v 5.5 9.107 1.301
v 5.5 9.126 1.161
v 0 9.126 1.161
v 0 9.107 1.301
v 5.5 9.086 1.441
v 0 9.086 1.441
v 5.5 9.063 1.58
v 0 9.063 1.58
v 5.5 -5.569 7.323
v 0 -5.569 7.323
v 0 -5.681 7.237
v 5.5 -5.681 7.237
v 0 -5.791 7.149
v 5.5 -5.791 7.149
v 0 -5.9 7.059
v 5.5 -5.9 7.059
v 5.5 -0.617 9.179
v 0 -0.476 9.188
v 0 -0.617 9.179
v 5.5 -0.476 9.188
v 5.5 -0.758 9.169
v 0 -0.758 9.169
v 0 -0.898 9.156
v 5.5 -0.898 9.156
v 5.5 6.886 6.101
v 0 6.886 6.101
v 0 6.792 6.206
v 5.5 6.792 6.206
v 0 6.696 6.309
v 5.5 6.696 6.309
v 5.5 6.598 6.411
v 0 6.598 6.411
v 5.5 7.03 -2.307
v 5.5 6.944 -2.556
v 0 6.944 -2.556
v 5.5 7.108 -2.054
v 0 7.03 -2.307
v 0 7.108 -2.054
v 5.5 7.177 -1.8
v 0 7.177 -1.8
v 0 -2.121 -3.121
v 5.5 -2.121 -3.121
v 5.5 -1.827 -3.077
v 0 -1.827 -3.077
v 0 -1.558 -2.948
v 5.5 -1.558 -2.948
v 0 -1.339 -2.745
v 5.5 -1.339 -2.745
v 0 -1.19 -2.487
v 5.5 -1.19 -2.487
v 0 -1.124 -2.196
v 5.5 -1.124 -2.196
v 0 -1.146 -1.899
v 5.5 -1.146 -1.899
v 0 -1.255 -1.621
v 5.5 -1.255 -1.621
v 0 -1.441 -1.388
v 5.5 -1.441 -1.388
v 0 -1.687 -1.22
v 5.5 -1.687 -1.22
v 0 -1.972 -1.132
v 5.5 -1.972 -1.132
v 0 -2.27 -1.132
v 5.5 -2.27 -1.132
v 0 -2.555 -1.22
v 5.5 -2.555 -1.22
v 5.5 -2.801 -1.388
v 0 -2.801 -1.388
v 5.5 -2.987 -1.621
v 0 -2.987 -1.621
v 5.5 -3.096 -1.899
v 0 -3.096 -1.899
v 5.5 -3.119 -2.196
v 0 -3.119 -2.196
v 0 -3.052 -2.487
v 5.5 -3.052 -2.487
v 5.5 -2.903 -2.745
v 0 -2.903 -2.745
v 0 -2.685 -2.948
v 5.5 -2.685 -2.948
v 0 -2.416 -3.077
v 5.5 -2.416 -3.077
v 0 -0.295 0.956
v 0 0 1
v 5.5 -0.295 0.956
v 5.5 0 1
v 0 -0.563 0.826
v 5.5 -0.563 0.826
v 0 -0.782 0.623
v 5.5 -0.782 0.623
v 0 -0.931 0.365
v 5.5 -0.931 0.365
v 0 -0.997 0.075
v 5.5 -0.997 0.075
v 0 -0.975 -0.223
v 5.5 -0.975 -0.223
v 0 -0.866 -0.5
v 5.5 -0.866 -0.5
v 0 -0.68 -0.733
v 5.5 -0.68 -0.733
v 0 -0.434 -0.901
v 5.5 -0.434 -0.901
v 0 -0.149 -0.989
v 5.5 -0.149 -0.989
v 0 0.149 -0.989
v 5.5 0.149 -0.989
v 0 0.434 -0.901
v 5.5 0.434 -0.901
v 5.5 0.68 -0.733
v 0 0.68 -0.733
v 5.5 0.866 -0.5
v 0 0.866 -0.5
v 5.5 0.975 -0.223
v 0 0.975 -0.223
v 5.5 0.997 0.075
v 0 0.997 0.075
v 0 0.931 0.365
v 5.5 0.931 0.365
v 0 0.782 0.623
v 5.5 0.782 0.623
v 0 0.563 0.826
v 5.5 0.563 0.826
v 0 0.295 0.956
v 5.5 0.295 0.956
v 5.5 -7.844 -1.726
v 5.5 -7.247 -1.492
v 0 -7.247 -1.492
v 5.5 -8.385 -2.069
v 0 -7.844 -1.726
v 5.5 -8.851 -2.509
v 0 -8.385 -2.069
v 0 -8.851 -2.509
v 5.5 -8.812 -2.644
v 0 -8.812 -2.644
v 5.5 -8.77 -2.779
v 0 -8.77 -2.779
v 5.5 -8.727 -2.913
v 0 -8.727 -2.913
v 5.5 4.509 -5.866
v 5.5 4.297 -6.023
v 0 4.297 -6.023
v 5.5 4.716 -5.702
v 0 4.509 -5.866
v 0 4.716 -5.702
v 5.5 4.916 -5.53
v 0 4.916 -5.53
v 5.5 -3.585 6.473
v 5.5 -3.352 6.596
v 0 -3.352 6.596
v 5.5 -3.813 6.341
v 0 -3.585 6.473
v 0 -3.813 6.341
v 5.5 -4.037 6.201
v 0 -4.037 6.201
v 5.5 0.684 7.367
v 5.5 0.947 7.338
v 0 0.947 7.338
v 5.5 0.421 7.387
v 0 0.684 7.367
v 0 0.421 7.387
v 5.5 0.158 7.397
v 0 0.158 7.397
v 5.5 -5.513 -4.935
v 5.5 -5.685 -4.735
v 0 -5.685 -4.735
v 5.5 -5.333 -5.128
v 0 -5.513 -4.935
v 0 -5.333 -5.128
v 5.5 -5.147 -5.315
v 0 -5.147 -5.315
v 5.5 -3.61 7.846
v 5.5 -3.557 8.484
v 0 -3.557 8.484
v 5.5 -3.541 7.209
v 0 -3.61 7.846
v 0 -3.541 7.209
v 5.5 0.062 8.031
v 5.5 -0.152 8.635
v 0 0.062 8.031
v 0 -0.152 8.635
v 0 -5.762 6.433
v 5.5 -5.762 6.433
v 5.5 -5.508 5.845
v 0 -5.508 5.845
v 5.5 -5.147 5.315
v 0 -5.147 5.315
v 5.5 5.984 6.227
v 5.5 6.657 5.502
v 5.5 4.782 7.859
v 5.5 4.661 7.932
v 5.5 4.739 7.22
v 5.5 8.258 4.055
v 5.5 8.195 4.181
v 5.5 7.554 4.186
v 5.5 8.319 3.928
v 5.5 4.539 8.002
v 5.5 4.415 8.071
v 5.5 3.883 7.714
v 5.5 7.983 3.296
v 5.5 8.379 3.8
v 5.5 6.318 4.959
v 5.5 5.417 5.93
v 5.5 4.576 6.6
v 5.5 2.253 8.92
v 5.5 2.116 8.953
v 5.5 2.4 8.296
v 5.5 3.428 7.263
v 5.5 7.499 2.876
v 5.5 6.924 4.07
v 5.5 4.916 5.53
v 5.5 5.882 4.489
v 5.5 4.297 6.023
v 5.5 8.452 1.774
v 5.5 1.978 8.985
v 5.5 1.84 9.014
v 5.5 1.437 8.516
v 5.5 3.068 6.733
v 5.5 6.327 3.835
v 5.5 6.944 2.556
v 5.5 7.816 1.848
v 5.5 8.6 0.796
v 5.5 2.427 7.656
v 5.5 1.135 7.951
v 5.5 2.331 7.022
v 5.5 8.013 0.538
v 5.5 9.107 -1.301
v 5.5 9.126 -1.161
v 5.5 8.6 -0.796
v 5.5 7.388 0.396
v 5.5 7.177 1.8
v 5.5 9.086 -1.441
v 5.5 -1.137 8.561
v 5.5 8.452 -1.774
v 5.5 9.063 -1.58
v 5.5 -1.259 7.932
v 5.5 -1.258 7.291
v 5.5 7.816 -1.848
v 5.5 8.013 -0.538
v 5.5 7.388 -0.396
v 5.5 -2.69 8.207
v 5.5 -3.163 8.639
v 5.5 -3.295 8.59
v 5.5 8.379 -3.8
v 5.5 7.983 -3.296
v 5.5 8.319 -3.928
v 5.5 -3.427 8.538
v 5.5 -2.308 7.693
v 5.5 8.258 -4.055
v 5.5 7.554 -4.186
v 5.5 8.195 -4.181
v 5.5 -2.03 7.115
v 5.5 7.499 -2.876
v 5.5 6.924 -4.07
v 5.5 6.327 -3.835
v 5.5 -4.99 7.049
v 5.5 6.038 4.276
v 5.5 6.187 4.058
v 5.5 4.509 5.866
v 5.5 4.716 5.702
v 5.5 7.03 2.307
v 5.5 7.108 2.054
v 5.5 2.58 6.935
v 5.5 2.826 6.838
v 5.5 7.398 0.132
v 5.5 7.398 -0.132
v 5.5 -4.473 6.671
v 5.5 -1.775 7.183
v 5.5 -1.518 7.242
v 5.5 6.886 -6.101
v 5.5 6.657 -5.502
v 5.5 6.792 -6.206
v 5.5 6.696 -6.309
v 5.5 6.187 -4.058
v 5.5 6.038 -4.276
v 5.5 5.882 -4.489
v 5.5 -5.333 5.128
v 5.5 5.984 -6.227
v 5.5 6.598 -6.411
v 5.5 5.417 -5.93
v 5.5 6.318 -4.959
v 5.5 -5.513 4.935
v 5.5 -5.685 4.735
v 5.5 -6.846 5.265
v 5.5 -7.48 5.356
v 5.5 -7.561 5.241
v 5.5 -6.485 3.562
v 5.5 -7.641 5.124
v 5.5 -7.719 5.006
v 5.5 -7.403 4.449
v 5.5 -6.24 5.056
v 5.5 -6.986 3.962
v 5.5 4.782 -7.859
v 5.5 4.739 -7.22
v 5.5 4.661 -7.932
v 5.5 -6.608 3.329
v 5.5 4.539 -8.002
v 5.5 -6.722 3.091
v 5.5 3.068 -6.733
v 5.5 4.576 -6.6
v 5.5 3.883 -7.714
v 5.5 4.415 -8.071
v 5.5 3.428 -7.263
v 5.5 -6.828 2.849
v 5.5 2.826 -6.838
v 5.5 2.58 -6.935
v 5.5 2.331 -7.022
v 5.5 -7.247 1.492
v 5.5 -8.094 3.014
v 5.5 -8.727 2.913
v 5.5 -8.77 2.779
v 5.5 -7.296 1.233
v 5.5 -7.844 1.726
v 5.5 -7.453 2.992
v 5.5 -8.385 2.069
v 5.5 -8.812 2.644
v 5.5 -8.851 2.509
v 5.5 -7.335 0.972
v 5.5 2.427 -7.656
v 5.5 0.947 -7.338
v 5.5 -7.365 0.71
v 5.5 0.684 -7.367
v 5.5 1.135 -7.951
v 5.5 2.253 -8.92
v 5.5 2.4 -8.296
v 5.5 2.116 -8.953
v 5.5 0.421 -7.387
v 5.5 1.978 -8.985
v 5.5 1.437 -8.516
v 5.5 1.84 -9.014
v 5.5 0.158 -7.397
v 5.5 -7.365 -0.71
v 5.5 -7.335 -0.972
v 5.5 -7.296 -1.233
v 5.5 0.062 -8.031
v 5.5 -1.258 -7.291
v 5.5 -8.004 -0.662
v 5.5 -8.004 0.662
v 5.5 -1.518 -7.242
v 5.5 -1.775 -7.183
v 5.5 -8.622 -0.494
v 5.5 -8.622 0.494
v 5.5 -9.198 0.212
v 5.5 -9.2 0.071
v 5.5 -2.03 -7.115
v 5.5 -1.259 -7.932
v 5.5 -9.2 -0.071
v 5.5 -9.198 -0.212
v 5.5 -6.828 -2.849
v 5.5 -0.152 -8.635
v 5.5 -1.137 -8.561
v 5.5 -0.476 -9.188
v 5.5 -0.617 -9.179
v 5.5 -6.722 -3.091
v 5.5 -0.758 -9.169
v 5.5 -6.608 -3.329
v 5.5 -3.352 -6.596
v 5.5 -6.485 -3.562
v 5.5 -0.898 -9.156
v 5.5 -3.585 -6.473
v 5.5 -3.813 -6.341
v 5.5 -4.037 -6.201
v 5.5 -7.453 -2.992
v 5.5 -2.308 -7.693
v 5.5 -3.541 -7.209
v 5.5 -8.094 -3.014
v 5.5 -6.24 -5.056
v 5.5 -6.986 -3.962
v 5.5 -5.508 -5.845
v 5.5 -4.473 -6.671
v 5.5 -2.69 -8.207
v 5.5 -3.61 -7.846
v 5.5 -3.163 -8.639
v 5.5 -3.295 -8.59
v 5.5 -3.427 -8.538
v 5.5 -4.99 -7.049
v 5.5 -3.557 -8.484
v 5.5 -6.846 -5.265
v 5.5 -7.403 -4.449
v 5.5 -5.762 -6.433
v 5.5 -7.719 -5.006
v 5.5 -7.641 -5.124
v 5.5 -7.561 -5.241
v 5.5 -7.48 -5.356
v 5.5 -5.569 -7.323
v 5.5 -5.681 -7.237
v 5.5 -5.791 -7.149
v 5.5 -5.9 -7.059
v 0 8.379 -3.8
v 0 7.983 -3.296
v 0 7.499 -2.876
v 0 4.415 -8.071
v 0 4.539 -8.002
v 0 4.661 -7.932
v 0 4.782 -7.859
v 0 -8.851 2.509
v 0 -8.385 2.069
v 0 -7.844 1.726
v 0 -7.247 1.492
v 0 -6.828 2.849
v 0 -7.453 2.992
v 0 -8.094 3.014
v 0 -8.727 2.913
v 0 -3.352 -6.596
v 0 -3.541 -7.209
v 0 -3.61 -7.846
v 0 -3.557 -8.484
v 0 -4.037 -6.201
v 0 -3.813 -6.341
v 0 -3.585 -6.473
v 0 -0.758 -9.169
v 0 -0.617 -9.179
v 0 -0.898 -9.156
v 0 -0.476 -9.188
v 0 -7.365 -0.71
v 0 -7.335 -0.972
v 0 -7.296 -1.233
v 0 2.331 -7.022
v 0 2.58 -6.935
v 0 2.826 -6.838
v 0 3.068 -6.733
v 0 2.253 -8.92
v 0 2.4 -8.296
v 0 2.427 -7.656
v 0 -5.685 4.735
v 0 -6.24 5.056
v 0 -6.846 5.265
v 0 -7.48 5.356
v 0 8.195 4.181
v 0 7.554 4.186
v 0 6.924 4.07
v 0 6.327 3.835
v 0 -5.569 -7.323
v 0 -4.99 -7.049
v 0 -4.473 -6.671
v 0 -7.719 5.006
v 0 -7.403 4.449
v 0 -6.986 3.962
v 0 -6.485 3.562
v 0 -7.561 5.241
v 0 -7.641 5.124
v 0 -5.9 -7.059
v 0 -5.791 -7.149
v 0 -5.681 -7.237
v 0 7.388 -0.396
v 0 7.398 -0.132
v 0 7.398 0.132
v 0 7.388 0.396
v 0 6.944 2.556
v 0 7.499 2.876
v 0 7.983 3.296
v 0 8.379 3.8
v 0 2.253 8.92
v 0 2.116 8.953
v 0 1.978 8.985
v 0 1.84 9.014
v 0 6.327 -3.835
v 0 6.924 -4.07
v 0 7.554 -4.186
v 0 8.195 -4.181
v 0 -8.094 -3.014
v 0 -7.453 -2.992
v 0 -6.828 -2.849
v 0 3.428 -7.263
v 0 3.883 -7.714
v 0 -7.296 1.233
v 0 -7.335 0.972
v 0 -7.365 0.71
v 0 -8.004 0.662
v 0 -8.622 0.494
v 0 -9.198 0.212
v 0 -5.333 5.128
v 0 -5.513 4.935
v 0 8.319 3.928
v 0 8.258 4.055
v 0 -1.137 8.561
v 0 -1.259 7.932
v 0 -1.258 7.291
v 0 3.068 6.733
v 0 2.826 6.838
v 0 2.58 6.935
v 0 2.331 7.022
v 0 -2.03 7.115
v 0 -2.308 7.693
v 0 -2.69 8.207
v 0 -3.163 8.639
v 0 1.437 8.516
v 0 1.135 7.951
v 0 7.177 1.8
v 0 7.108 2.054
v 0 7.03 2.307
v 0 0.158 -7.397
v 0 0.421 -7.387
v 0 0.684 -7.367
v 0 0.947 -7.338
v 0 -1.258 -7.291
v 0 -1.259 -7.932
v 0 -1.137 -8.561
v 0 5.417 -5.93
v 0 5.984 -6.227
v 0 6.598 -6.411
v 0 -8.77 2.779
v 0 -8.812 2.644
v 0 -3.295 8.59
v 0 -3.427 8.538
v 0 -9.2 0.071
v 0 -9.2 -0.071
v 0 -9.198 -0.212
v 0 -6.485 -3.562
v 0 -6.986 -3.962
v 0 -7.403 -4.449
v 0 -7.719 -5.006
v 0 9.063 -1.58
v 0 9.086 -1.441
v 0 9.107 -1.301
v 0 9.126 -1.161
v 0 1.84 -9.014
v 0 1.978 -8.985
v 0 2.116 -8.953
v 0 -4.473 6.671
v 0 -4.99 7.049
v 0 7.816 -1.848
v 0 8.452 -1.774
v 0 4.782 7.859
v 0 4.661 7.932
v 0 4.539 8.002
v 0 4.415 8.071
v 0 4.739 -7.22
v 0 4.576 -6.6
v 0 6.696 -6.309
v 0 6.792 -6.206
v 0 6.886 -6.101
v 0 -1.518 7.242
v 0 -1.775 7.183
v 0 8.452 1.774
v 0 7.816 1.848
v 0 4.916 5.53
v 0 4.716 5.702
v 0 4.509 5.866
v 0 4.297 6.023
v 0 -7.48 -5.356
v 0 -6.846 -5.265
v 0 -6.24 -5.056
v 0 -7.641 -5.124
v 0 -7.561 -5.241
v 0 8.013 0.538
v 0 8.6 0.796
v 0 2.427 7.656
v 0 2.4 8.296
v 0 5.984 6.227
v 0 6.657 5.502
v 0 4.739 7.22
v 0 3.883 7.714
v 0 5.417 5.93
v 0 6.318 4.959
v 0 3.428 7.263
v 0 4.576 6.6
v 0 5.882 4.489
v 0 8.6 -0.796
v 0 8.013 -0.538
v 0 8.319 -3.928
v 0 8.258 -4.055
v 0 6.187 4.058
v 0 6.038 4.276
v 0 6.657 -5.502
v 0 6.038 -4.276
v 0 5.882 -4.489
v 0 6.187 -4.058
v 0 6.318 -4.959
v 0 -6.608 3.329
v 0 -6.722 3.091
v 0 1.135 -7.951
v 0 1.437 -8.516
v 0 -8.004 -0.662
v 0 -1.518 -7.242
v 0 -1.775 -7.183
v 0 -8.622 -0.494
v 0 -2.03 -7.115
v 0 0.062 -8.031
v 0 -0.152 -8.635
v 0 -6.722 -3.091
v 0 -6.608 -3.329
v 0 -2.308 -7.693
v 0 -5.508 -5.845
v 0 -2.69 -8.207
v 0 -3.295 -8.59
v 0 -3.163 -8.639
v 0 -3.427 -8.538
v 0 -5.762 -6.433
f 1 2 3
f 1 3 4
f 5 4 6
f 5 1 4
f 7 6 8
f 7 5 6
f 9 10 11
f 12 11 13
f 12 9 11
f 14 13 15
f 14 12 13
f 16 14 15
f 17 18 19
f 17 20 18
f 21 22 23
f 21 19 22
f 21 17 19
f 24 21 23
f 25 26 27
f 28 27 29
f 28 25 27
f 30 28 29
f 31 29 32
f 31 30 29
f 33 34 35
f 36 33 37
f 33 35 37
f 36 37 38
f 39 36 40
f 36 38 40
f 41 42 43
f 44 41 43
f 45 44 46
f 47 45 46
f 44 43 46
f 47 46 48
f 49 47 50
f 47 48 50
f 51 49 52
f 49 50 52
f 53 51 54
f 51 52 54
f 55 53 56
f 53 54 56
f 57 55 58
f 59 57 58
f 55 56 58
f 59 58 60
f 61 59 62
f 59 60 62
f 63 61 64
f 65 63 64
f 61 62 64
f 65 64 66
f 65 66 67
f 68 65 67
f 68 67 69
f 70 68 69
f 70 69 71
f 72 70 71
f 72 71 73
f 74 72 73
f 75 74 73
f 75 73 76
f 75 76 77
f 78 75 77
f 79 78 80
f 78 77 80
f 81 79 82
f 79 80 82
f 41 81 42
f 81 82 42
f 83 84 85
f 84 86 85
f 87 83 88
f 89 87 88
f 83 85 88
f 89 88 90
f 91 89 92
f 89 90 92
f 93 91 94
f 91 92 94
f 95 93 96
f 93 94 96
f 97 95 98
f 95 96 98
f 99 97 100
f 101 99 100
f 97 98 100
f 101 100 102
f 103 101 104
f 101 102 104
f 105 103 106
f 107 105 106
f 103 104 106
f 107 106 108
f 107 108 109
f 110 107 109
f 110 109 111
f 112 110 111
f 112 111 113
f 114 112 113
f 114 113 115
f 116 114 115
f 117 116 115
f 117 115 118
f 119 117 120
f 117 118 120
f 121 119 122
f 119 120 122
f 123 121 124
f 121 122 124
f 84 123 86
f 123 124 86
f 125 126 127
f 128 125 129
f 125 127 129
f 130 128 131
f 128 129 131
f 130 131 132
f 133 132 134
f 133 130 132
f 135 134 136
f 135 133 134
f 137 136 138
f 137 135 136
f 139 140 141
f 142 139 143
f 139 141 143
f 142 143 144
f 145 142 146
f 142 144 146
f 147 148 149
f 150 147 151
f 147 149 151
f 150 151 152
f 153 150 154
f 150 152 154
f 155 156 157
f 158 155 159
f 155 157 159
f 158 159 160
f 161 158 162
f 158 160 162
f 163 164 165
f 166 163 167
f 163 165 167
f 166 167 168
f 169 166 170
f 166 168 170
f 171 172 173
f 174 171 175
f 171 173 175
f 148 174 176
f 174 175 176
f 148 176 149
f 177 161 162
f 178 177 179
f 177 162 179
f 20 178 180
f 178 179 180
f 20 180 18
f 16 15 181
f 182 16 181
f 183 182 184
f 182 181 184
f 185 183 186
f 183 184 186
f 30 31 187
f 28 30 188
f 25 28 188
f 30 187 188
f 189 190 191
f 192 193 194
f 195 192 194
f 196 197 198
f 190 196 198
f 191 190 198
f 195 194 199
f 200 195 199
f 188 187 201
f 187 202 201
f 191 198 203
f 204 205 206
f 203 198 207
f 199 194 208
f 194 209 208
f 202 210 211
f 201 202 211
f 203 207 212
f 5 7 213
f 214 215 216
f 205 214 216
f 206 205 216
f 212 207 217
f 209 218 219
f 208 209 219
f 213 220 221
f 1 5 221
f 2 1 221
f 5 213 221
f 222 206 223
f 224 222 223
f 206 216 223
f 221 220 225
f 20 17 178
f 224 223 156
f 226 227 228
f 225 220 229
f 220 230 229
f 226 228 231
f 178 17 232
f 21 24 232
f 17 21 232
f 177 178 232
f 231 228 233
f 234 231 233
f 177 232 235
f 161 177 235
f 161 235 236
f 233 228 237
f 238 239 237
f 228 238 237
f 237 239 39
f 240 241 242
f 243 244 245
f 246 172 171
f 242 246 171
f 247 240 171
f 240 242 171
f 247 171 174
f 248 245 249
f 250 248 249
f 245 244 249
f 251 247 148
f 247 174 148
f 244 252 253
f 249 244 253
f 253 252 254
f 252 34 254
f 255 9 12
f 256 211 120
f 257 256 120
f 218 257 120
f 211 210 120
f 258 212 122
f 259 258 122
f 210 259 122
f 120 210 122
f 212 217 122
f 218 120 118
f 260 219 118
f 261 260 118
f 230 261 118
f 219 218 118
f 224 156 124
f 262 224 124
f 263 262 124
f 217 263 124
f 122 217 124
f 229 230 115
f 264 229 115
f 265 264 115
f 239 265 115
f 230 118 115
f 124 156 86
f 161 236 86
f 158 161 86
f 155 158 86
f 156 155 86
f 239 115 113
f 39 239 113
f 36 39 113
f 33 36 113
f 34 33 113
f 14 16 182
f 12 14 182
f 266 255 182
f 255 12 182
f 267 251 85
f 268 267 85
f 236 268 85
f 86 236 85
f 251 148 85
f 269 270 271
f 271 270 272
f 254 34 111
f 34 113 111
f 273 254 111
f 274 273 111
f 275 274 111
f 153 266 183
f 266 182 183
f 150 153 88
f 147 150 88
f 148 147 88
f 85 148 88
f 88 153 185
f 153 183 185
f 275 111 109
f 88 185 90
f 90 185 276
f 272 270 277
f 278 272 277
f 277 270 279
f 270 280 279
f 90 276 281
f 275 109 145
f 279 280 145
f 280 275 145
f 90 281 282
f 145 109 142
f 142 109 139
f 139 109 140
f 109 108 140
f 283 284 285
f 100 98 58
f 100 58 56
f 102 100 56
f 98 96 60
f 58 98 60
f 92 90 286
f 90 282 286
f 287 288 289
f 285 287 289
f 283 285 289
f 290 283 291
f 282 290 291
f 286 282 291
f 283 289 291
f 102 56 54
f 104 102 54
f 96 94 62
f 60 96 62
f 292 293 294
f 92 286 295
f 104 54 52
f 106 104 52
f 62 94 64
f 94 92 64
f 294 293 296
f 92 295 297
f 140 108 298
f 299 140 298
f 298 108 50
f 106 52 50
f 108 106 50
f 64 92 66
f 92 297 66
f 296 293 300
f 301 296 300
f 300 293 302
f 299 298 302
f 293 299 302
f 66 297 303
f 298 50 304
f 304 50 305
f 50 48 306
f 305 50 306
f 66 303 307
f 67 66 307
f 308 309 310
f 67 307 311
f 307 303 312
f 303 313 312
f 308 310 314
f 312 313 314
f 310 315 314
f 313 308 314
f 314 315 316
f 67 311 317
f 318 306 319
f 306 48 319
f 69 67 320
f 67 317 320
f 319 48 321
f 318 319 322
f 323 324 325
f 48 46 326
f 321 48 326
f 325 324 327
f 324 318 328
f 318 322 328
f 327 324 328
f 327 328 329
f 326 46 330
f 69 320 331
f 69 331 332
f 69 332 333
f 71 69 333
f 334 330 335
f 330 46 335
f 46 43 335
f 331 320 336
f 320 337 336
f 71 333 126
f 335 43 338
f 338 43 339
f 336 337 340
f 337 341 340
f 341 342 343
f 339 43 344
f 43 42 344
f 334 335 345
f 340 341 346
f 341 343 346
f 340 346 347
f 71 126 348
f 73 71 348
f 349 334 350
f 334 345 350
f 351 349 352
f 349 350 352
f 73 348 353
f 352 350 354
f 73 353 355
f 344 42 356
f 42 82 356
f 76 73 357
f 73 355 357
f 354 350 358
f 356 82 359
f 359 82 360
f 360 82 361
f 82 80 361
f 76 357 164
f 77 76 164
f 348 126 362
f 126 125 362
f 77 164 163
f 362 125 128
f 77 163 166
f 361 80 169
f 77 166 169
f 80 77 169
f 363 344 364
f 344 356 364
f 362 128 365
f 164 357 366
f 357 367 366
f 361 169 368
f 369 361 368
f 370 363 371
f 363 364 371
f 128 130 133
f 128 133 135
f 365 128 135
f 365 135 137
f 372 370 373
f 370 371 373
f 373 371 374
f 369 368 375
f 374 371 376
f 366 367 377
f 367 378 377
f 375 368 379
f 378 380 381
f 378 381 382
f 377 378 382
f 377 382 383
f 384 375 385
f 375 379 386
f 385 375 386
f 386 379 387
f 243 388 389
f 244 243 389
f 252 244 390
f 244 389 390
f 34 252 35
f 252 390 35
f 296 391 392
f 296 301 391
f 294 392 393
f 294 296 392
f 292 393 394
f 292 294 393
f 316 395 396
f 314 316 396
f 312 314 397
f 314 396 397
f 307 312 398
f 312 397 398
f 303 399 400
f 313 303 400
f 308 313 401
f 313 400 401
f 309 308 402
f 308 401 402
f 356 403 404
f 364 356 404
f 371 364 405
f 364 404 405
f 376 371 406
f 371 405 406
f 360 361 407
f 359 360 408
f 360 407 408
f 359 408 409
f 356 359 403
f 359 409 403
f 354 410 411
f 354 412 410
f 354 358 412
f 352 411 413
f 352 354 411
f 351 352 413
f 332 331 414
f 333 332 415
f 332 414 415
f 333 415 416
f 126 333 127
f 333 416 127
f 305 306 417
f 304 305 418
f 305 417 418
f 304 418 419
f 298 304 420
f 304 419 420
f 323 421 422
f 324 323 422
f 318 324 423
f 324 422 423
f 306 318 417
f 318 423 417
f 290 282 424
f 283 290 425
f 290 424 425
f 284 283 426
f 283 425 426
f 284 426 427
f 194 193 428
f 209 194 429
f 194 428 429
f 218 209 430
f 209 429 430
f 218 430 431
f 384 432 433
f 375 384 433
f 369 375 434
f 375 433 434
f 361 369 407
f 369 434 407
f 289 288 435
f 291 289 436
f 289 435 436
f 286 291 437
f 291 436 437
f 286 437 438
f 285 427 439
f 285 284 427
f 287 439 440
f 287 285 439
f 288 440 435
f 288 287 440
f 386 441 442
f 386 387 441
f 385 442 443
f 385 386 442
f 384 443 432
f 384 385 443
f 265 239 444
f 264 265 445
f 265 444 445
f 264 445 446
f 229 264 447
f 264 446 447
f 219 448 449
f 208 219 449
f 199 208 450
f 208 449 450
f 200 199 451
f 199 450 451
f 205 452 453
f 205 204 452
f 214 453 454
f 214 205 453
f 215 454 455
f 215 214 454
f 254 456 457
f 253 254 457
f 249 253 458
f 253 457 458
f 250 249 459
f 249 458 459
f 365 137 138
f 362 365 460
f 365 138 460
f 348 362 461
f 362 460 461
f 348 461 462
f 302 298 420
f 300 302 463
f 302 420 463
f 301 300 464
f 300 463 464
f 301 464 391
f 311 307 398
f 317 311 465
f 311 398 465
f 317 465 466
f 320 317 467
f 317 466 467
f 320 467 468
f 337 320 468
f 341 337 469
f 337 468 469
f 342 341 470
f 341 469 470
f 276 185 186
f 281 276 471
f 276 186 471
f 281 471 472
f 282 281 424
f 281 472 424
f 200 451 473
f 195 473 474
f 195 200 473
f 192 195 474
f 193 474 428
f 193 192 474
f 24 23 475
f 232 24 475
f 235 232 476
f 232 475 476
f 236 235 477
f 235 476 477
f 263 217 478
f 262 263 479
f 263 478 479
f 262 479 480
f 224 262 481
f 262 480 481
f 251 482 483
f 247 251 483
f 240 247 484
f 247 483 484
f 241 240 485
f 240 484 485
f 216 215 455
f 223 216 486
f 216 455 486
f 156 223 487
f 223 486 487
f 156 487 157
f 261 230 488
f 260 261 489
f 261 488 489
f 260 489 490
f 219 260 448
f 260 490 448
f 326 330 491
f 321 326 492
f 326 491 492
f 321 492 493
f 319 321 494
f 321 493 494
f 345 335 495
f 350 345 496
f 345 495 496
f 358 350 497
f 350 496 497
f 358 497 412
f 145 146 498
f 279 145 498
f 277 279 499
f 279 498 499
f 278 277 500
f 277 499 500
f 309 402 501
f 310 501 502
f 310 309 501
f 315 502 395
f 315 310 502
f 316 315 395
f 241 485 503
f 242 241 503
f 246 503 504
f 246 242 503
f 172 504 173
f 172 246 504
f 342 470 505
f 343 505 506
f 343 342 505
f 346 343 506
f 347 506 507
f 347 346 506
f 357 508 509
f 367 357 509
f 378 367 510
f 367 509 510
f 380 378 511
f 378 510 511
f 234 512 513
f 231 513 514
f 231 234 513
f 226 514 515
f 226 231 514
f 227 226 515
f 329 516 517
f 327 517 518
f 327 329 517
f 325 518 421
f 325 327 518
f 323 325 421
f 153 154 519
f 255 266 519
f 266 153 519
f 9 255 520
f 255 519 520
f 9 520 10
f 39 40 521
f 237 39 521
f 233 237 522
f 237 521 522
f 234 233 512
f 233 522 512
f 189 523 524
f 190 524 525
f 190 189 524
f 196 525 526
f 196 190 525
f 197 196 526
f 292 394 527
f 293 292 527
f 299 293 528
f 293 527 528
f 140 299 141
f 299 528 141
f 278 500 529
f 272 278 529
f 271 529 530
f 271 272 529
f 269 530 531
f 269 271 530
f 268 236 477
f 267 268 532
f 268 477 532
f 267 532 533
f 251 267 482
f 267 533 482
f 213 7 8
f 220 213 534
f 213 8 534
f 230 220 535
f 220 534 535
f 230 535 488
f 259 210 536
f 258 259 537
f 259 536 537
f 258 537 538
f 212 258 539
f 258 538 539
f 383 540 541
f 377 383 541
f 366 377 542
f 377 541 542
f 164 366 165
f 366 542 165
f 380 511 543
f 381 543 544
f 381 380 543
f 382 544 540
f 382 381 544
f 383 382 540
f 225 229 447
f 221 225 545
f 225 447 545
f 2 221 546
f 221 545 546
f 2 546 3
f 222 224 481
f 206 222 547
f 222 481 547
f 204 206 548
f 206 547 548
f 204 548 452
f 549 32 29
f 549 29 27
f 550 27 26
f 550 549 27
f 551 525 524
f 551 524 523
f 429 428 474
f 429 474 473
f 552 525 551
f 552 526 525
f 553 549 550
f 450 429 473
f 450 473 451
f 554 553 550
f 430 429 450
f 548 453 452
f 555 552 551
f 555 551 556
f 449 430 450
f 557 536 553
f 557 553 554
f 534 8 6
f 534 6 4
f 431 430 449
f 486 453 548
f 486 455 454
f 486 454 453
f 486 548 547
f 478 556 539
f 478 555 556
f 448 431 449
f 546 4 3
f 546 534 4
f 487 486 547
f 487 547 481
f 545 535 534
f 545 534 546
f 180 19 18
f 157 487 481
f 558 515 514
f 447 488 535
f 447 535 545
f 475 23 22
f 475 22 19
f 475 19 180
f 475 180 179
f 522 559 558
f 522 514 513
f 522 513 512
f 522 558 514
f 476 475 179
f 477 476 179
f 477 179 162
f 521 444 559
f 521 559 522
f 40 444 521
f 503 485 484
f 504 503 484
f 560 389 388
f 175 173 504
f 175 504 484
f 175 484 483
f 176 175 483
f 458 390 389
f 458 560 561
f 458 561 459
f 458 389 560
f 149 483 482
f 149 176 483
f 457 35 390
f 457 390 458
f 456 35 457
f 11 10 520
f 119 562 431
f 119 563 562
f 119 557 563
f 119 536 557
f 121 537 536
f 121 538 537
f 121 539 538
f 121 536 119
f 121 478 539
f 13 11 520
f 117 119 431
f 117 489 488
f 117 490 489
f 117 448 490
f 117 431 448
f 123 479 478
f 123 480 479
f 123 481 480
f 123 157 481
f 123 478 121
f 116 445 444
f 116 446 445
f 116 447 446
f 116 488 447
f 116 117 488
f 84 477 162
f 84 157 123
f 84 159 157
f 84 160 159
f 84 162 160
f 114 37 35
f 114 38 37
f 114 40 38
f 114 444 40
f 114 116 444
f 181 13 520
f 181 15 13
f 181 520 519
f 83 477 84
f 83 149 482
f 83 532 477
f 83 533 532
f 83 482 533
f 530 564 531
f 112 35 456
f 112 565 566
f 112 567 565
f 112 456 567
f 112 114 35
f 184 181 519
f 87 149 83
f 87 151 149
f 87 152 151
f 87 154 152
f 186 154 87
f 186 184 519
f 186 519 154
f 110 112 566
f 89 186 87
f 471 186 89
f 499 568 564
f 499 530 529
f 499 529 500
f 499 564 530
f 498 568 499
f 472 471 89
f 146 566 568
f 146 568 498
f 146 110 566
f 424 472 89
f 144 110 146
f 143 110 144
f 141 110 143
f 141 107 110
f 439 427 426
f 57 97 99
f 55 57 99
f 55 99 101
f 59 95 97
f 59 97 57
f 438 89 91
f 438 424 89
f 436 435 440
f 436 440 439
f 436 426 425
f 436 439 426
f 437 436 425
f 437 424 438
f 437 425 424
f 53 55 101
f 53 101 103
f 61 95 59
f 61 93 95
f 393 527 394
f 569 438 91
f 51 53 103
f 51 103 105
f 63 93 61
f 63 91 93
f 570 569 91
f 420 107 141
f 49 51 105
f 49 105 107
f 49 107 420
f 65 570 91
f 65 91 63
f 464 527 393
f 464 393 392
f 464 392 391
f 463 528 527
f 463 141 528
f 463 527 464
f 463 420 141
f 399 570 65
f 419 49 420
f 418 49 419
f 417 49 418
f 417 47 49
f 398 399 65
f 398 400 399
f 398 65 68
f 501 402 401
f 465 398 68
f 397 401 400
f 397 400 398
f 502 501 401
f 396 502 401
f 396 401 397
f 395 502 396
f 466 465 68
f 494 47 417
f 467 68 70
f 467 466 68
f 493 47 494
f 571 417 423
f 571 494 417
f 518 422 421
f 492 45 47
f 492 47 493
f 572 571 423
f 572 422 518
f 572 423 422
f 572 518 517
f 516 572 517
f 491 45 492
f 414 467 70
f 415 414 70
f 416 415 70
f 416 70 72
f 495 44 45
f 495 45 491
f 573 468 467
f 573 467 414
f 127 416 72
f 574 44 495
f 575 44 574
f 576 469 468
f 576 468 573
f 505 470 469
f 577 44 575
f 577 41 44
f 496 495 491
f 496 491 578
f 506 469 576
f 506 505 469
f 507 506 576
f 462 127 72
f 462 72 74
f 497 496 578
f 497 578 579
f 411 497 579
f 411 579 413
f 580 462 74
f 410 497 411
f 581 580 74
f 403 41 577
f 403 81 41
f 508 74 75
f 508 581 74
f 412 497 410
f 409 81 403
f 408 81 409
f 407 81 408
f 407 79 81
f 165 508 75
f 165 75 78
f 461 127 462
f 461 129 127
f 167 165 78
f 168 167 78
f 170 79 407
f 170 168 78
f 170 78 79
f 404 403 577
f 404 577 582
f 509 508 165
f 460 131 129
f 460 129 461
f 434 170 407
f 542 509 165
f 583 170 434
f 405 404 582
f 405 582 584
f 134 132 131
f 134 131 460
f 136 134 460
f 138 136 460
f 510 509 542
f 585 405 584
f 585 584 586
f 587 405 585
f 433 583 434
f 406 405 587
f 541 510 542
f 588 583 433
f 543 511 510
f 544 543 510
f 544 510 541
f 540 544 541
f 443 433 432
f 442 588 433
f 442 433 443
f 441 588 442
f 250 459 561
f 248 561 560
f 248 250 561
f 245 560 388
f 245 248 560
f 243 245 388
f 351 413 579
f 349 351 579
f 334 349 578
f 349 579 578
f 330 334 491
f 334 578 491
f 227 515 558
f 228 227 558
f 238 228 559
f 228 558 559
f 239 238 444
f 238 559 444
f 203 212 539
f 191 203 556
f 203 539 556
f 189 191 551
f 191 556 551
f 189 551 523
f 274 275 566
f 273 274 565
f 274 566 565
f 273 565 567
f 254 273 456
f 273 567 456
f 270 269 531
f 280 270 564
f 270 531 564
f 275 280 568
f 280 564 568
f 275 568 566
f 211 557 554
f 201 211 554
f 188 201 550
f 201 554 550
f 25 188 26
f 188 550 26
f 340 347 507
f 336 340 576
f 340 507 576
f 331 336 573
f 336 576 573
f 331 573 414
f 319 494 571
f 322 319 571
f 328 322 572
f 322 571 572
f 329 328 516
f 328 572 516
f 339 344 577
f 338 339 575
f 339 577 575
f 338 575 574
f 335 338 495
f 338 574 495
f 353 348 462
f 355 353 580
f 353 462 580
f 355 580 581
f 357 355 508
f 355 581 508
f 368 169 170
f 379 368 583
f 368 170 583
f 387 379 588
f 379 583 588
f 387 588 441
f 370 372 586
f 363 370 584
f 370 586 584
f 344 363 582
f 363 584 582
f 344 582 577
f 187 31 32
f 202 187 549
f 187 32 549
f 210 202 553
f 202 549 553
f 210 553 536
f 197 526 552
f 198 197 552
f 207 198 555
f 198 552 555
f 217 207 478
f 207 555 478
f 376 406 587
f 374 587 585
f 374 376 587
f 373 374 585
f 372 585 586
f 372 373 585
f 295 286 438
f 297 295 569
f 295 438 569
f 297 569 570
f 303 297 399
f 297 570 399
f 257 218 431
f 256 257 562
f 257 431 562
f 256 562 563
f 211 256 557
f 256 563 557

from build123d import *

# Parameters (mm, degrees)
BASPROSKE_W        = 5.5
BASPROSKE_H        = 9.2
TOOTHCUT_DEPTH     = 15.12550884
TEETHCUTS_COUNT    = 21
TEETHCUTS_ANGLE    = 342.857142857
BORSKE_R           = 1
BORE_DEPTH         = 50.0000508
SKETCH1_R          = 1
CUT_EXTRUDE1_DEPTH = 5.5


with BuildPart() as part:
    # BasProSke → Base-Revolve (revolve)
    with BuildSketch(Plane(origin=(0, 0, 0), x_dir=(1, 0, 0), z_dir=(0, 1, 0)), mode=Mode.PRIVATE) as base_revolve_sk:
        with Locations((2.75, 4.6)):
            Rectangle(BASPROSKE_W, BASPROSKE_H)
    revolve(base_revolve_sk.sketch.rotate(Axis((-10, 0, 0), (1, 0, 0)), 180), axis=Axis((-10, 0, 0), (1, 0, 0)))

    # TooCutSke → ToothCut (cut, through all)
    with BuildSketch(Plane(origin=(0, 0, 0), x_dir=(0, 0, -1), z_dir=(1, 0, 0))):
        with BuildLine():
            ThreePointArc((0.39557227, 7.388418205), (0, 7.399), (-0.39557227, 7.388418205))
            ThreePointArc((-0.39557227, 7.388418205), (-0.659317872, 8.326513344), (-1.181161837, 9.149473311))
            ThreePointArc((-1.181161837, 9.149473311), (0, 9.2254), (1.181161837, 9.149473311))
            ThreePointArc((1.181161837, 9.149473311), (0.659317872, 8.326513344), (0.39557227, 7.388418205))
        make_face()
    toothcut = extrude(amount=TOOTHCUT_DEPTH, mode=Mode.SUBTRACT)

    # TeethCuts: ToothCut ×21 about axis
    teethcuts_axis = Axis((-10, 0, 0), (1, 0, 0))
    for i in range(1, TEETHCUTS_COUNT):
        add(toothcut.rotate(teethcuts_axis, i * TEETHCUTS_ANGLE / (TEETHCUTS_COUNT - 1)), mode=Mode.SUBTRACT)

    # BorSke → Bore (cut, symmetric)
    with BuildSketch(Plane(origin=(0, 0, 0), x_dir=(0, 0, -1), z_dir=(1, 0, 0))):
        with Locations(Location((0, 0, 0), (0, 0, 180))):
            Circle(BORSKE_R)
    extrude(amount=BORE_DEPTH, both=True, mode=Mode.SUBTRACT)

    # Sketch1 → Cut-Extrude1 (cut)
    with BuildSketch(Plane(origin=(5.5, 0, 0), x_dir=(0, 0, -1), z_dir=(1, 0, 0))):
        with Locations((2.121320344, -2.121320344)):
            Circle(SKETCH1_R)
    extrude(amount=-CUT_EXTRUDE1_DEPTH, mode=Mode.SUBTRACT)


solid = part.part
